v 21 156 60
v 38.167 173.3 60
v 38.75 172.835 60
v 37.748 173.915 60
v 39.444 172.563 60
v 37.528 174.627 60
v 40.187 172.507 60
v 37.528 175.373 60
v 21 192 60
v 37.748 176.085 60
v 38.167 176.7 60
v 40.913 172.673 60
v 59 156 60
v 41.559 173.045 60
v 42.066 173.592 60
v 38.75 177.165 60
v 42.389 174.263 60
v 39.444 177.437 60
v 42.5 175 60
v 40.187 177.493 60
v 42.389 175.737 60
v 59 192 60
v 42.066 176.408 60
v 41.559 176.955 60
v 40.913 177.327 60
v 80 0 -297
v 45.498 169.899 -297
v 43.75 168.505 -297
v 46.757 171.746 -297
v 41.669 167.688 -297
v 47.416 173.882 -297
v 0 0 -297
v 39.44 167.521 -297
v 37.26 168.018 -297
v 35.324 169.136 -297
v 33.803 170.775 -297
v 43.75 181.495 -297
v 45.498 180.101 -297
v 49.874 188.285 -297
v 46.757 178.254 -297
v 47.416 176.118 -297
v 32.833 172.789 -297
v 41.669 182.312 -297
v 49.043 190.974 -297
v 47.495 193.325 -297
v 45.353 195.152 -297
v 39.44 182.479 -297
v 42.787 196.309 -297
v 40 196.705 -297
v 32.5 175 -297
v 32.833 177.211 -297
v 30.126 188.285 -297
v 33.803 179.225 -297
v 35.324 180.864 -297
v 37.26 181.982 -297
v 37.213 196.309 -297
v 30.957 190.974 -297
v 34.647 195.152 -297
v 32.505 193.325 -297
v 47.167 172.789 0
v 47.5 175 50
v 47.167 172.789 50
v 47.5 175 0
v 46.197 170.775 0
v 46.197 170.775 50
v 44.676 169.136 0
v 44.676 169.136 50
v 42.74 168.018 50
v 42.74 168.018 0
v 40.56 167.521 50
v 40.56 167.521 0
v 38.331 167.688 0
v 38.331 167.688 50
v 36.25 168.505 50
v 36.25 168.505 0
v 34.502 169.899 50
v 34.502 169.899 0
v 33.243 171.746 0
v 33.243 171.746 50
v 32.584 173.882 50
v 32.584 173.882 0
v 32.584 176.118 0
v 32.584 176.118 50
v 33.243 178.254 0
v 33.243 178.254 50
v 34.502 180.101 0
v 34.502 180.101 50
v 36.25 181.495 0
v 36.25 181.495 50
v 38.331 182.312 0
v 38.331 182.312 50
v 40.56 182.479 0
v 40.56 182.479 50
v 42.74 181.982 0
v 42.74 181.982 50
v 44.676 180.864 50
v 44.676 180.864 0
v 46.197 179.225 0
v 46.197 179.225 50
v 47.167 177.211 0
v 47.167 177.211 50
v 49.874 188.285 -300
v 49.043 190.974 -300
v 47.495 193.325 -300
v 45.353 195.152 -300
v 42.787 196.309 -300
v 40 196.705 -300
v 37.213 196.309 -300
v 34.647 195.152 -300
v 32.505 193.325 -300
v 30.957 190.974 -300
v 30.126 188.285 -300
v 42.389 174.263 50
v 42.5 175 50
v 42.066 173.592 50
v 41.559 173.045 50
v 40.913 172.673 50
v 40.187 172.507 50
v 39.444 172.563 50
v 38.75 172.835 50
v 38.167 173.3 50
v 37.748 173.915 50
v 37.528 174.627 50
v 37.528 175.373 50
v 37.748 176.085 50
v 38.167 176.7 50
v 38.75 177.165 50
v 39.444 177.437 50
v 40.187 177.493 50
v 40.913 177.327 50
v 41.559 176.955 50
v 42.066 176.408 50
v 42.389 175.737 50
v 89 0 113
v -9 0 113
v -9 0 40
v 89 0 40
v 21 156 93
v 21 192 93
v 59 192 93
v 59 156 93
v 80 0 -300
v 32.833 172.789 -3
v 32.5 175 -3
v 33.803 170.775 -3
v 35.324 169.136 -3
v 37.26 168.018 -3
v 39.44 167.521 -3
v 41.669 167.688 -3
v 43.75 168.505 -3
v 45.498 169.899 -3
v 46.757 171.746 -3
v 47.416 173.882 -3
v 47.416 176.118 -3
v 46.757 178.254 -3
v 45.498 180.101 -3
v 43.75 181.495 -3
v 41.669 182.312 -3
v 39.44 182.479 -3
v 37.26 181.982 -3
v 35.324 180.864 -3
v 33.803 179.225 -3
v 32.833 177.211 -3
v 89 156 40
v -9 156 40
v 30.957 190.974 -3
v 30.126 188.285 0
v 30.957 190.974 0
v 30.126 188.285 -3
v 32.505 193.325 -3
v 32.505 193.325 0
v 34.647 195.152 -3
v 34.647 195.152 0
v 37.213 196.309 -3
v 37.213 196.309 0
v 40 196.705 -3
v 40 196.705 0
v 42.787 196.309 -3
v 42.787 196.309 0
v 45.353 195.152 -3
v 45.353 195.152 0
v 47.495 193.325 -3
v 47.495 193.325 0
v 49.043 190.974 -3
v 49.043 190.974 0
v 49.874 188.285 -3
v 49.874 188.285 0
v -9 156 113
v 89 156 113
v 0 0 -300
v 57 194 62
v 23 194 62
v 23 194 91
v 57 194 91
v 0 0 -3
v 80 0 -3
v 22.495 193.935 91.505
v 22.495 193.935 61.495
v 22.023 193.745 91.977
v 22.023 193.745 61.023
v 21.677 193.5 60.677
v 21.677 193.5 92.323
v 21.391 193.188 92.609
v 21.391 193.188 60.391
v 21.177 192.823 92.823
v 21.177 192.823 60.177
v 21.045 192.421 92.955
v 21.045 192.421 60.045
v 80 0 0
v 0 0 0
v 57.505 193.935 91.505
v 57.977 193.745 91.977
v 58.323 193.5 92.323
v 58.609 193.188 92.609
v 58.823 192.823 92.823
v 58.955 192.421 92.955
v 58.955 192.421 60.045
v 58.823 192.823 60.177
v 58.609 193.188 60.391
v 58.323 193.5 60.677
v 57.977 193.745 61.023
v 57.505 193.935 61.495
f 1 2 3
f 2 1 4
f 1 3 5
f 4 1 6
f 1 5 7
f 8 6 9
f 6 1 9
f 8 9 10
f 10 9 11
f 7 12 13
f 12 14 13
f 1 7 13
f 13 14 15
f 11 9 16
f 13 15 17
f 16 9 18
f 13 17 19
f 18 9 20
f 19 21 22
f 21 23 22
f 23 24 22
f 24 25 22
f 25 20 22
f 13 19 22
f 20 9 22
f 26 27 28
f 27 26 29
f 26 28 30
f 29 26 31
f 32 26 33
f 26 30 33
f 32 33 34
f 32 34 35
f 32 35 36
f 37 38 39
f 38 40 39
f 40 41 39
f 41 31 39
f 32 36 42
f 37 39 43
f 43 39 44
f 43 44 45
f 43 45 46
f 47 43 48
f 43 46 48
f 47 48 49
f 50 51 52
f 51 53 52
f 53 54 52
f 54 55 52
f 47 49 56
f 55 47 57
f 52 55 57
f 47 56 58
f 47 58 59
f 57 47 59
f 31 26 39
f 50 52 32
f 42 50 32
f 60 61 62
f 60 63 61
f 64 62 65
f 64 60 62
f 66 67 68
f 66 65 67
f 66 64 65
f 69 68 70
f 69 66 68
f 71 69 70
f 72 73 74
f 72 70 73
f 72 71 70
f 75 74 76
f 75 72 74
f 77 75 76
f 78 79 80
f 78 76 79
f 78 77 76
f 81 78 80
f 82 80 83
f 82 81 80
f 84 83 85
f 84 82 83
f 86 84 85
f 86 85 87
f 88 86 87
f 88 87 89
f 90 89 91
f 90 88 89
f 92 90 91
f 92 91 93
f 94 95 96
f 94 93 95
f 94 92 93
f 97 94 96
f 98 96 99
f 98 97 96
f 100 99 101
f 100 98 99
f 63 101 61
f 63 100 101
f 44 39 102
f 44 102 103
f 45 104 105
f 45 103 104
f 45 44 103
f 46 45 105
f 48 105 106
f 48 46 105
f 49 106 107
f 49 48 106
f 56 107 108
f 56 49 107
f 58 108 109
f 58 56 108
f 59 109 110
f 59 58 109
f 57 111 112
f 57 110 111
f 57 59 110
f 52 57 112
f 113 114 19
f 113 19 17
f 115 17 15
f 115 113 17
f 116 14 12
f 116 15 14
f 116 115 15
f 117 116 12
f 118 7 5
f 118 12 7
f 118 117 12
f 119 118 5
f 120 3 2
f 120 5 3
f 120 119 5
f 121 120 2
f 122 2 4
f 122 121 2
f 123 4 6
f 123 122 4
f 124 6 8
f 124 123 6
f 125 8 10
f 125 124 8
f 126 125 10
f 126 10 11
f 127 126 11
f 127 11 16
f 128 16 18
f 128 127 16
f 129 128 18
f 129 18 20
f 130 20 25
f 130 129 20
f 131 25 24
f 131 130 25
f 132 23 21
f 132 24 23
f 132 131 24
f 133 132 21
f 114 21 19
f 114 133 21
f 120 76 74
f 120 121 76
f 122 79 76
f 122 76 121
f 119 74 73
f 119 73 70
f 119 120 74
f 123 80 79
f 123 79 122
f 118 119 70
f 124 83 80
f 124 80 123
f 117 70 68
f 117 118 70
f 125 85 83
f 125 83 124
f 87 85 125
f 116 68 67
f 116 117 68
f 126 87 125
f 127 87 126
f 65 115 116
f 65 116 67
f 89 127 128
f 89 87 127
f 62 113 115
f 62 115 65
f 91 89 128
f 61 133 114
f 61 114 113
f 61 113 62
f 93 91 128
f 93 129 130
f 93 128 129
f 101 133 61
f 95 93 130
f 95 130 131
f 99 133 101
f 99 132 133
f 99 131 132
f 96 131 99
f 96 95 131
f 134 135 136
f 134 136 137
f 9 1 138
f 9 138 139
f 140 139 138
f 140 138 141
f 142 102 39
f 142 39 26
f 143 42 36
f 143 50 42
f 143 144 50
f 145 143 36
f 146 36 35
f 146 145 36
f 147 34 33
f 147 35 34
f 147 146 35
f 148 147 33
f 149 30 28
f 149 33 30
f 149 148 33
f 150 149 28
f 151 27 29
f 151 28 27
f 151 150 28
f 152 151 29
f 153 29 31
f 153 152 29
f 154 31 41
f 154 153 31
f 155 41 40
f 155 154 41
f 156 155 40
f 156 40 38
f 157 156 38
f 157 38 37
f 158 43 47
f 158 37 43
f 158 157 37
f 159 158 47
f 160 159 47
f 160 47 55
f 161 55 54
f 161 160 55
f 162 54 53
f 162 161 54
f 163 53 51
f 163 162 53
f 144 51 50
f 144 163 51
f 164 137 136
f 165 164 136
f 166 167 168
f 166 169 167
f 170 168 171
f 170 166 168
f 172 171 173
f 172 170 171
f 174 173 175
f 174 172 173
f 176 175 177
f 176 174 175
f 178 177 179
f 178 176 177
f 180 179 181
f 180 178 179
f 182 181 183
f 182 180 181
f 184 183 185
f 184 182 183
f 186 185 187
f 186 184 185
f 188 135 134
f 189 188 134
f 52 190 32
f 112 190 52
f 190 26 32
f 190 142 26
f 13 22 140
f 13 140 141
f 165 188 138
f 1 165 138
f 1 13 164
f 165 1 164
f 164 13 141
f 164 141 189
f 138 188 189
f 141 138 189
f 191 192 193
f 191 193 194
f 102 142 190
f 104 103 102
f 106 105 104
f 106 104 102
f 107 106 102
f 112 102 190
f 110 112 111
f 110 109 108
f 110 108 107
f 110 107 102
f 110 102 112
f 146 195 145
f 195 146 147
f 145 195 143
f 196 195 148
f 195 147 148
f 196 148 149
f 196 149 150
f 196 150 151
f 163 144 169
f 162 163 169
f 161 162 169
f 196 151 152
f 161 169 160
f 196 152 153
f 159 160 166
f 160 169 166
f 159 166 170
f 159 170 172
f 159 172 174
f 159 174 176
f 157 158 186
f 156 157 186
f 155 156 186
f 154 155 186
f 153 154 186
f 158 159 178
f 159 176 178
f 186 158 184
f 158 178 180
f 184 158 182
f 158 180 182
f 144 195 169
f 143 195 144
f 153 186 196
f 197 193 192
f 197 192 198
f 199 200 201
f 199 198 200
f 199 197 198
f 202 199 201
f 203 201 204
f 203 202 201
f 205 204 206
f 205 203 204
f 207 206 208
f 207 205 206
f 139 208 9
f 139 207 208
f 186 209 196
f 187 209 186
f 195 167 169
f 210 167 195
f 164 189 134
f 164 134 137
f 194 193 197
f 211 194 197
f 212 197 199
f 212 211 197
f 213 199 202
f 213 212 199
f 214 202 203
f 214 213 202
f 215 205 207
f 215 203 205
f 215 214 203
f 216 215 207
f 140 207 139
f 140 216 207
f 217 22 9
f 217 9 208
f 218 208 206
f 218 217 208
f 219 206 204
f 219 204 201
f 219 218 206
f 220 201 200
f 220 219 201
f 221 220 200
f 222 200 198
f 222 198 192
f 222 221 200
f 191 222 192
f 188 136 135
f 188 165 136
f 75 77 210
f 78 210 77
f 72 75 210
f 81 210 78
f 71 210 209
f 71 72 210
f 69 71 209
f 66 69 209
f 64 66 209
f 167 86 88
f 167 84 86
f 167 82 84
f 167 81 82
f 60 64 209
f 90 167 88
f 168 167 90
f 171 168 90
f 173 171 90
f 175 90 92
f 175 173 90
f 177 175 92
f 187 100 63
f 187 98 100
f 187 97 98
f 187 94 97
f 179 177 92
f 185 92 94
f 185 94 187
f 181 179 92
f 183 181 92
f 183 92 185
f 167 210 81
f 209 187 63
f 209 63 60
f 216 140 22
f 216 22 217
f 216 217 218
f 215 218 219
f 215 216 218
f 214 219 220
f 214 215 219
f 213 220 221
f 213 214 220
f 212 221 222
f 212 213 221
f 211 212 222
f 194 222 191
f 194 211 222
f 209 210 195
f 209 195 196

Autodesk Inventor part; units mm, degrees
ref_plane "YZ Plane" through (0, 0, 0) normal (1, 0, 0) x (0, 1, 0)
ref_plane "XZ Plane" through (0, 0, 0) normal (0, 1, 0) x (-1, 0, 0)
ref_plane "XY Plane" through (0, 0, 0) normal (0, 0, 1) x (1, 0, 0)
sketch "Sketch1" plane through (0, 0, 0) normal (0, 0, 1) x (1, 0, 0)
  point P0 (0, 0)
sketch "Sketch2" plane through (0, 0, 0) normal (0, 0, 1) x (1, 0, 0)
  line L0 (0, 0) -> (80, 0)
  line L1 (80, 0) -> (40, 250)
  line L2 (40, 250) -> (0, 0)
  dimension "d0" = 80
  dimension "d1" = 250
  dimension "d2" = 40
extrude "Extrusion1" add sketch "Sketch2" against normal blind 3
sketch "Sketch3" plane through (0, 0, -3) normal (0, 0, -1) x (-1, 0, 0)
  circle A0 centre (-40, 175) radius 7.5
  line L0 (-80, 0) -> (0, 0) projected
  point P0 (-40, 250)
  point P1 (-40, 0)
  dimension "d5" = 15
  dimension "d6" = 0
  dimension "d7" = 175
fillet "Fillet1" radius 10 1 edges at (40, 250, -1.5)
extrude "Extrusion2" add sketch "Sketch3" along normal blind 147
mirror "Mirror1" about plane through (40, 175, -150) normal (0, 0, -1) of "Extrusion2", "Extrusion1"
fillet "Fillet2" radius 10 1 edges at (40, 250, -298.5)
sketch "Sketch4" plane through (0, 0, 0) normal (0, 0, 1) x (1, 0, 0)
  circle A0 centre (40, 175) radius 7.5 projected
  circle A1 centre (40, 175) radius 7.5
  point P0 (0, 0)
extrude "Extrusion3" add sketch "Sketch4" along normal blind 50
sketch "Sketch5" plane through (40, 175, 50) normal (0, 0, 1) x (1, 0, 0)
  circle A0 centre (0, 0) radius 2.5
  point P0 (-40, -175)
  dimension "d14" = 5
extrude "Extrusion4" add sketch "Sketch5" along normal blind 10
sketch "Sketch6" plane through (40, 175, 60) normal (0, 0, 1) x (1, 0, 0)
  line L0 (-19, 19) -> (19, 19)
  line L1 (19, 19) -> (19, -19)
  line L2 (19, -19) -> (-19, -19)
  line L3 (-19, -19) -> (-19, 19)
  circle A0 centre (0, 0) radius 2.5 projected
  point P0 (-40, -175)
  dimension "d17" = 38
  dimension "d18" = 38
  dimension "d19" = 19
  dimension "d20" = 19
extrude "Extrusion5" add sketch "Sketch6" along normal blind 33 contours L0 L1 L2 L3 | A0
sketch "Sketch7" plane through (21, 156, 60) normal (0, -1, 0) x (1, 0, 0)
  line L0 (-30, 53) -> (68, 53)
  line L1 (68, 53) -> (68, -20)
  line L2 (68, -20) -> (-30, -20)
  line L3 (-30, -20) -> (-30, 53)
  line L4 (38, 0) -> (38, 33) projected
  line L5 (0, 0) -> (0, 33) projected
  line L6 (0, 33) -> (38, 33) projected
  point P0 (-21, -60)
  point P1 (38, 16.5)
  point P2 (68, 16.5)
  point P3 (-30, 16.5)
  point P4 (0, 16.5)
  dimension "d23" = 30
  dimension "d24" = 30
  dimension "d25" = 20
  dimension "d26" = 20
extrude "Extrusion6" add sketch "Sketch7" along normal blind 156
fillet "Fillet3" radius 2 4 edges at (21, 194, 76.5) (59, 194, 76.5) (40, 194, 60) (40, 194, 93)
properties part number "stand"
